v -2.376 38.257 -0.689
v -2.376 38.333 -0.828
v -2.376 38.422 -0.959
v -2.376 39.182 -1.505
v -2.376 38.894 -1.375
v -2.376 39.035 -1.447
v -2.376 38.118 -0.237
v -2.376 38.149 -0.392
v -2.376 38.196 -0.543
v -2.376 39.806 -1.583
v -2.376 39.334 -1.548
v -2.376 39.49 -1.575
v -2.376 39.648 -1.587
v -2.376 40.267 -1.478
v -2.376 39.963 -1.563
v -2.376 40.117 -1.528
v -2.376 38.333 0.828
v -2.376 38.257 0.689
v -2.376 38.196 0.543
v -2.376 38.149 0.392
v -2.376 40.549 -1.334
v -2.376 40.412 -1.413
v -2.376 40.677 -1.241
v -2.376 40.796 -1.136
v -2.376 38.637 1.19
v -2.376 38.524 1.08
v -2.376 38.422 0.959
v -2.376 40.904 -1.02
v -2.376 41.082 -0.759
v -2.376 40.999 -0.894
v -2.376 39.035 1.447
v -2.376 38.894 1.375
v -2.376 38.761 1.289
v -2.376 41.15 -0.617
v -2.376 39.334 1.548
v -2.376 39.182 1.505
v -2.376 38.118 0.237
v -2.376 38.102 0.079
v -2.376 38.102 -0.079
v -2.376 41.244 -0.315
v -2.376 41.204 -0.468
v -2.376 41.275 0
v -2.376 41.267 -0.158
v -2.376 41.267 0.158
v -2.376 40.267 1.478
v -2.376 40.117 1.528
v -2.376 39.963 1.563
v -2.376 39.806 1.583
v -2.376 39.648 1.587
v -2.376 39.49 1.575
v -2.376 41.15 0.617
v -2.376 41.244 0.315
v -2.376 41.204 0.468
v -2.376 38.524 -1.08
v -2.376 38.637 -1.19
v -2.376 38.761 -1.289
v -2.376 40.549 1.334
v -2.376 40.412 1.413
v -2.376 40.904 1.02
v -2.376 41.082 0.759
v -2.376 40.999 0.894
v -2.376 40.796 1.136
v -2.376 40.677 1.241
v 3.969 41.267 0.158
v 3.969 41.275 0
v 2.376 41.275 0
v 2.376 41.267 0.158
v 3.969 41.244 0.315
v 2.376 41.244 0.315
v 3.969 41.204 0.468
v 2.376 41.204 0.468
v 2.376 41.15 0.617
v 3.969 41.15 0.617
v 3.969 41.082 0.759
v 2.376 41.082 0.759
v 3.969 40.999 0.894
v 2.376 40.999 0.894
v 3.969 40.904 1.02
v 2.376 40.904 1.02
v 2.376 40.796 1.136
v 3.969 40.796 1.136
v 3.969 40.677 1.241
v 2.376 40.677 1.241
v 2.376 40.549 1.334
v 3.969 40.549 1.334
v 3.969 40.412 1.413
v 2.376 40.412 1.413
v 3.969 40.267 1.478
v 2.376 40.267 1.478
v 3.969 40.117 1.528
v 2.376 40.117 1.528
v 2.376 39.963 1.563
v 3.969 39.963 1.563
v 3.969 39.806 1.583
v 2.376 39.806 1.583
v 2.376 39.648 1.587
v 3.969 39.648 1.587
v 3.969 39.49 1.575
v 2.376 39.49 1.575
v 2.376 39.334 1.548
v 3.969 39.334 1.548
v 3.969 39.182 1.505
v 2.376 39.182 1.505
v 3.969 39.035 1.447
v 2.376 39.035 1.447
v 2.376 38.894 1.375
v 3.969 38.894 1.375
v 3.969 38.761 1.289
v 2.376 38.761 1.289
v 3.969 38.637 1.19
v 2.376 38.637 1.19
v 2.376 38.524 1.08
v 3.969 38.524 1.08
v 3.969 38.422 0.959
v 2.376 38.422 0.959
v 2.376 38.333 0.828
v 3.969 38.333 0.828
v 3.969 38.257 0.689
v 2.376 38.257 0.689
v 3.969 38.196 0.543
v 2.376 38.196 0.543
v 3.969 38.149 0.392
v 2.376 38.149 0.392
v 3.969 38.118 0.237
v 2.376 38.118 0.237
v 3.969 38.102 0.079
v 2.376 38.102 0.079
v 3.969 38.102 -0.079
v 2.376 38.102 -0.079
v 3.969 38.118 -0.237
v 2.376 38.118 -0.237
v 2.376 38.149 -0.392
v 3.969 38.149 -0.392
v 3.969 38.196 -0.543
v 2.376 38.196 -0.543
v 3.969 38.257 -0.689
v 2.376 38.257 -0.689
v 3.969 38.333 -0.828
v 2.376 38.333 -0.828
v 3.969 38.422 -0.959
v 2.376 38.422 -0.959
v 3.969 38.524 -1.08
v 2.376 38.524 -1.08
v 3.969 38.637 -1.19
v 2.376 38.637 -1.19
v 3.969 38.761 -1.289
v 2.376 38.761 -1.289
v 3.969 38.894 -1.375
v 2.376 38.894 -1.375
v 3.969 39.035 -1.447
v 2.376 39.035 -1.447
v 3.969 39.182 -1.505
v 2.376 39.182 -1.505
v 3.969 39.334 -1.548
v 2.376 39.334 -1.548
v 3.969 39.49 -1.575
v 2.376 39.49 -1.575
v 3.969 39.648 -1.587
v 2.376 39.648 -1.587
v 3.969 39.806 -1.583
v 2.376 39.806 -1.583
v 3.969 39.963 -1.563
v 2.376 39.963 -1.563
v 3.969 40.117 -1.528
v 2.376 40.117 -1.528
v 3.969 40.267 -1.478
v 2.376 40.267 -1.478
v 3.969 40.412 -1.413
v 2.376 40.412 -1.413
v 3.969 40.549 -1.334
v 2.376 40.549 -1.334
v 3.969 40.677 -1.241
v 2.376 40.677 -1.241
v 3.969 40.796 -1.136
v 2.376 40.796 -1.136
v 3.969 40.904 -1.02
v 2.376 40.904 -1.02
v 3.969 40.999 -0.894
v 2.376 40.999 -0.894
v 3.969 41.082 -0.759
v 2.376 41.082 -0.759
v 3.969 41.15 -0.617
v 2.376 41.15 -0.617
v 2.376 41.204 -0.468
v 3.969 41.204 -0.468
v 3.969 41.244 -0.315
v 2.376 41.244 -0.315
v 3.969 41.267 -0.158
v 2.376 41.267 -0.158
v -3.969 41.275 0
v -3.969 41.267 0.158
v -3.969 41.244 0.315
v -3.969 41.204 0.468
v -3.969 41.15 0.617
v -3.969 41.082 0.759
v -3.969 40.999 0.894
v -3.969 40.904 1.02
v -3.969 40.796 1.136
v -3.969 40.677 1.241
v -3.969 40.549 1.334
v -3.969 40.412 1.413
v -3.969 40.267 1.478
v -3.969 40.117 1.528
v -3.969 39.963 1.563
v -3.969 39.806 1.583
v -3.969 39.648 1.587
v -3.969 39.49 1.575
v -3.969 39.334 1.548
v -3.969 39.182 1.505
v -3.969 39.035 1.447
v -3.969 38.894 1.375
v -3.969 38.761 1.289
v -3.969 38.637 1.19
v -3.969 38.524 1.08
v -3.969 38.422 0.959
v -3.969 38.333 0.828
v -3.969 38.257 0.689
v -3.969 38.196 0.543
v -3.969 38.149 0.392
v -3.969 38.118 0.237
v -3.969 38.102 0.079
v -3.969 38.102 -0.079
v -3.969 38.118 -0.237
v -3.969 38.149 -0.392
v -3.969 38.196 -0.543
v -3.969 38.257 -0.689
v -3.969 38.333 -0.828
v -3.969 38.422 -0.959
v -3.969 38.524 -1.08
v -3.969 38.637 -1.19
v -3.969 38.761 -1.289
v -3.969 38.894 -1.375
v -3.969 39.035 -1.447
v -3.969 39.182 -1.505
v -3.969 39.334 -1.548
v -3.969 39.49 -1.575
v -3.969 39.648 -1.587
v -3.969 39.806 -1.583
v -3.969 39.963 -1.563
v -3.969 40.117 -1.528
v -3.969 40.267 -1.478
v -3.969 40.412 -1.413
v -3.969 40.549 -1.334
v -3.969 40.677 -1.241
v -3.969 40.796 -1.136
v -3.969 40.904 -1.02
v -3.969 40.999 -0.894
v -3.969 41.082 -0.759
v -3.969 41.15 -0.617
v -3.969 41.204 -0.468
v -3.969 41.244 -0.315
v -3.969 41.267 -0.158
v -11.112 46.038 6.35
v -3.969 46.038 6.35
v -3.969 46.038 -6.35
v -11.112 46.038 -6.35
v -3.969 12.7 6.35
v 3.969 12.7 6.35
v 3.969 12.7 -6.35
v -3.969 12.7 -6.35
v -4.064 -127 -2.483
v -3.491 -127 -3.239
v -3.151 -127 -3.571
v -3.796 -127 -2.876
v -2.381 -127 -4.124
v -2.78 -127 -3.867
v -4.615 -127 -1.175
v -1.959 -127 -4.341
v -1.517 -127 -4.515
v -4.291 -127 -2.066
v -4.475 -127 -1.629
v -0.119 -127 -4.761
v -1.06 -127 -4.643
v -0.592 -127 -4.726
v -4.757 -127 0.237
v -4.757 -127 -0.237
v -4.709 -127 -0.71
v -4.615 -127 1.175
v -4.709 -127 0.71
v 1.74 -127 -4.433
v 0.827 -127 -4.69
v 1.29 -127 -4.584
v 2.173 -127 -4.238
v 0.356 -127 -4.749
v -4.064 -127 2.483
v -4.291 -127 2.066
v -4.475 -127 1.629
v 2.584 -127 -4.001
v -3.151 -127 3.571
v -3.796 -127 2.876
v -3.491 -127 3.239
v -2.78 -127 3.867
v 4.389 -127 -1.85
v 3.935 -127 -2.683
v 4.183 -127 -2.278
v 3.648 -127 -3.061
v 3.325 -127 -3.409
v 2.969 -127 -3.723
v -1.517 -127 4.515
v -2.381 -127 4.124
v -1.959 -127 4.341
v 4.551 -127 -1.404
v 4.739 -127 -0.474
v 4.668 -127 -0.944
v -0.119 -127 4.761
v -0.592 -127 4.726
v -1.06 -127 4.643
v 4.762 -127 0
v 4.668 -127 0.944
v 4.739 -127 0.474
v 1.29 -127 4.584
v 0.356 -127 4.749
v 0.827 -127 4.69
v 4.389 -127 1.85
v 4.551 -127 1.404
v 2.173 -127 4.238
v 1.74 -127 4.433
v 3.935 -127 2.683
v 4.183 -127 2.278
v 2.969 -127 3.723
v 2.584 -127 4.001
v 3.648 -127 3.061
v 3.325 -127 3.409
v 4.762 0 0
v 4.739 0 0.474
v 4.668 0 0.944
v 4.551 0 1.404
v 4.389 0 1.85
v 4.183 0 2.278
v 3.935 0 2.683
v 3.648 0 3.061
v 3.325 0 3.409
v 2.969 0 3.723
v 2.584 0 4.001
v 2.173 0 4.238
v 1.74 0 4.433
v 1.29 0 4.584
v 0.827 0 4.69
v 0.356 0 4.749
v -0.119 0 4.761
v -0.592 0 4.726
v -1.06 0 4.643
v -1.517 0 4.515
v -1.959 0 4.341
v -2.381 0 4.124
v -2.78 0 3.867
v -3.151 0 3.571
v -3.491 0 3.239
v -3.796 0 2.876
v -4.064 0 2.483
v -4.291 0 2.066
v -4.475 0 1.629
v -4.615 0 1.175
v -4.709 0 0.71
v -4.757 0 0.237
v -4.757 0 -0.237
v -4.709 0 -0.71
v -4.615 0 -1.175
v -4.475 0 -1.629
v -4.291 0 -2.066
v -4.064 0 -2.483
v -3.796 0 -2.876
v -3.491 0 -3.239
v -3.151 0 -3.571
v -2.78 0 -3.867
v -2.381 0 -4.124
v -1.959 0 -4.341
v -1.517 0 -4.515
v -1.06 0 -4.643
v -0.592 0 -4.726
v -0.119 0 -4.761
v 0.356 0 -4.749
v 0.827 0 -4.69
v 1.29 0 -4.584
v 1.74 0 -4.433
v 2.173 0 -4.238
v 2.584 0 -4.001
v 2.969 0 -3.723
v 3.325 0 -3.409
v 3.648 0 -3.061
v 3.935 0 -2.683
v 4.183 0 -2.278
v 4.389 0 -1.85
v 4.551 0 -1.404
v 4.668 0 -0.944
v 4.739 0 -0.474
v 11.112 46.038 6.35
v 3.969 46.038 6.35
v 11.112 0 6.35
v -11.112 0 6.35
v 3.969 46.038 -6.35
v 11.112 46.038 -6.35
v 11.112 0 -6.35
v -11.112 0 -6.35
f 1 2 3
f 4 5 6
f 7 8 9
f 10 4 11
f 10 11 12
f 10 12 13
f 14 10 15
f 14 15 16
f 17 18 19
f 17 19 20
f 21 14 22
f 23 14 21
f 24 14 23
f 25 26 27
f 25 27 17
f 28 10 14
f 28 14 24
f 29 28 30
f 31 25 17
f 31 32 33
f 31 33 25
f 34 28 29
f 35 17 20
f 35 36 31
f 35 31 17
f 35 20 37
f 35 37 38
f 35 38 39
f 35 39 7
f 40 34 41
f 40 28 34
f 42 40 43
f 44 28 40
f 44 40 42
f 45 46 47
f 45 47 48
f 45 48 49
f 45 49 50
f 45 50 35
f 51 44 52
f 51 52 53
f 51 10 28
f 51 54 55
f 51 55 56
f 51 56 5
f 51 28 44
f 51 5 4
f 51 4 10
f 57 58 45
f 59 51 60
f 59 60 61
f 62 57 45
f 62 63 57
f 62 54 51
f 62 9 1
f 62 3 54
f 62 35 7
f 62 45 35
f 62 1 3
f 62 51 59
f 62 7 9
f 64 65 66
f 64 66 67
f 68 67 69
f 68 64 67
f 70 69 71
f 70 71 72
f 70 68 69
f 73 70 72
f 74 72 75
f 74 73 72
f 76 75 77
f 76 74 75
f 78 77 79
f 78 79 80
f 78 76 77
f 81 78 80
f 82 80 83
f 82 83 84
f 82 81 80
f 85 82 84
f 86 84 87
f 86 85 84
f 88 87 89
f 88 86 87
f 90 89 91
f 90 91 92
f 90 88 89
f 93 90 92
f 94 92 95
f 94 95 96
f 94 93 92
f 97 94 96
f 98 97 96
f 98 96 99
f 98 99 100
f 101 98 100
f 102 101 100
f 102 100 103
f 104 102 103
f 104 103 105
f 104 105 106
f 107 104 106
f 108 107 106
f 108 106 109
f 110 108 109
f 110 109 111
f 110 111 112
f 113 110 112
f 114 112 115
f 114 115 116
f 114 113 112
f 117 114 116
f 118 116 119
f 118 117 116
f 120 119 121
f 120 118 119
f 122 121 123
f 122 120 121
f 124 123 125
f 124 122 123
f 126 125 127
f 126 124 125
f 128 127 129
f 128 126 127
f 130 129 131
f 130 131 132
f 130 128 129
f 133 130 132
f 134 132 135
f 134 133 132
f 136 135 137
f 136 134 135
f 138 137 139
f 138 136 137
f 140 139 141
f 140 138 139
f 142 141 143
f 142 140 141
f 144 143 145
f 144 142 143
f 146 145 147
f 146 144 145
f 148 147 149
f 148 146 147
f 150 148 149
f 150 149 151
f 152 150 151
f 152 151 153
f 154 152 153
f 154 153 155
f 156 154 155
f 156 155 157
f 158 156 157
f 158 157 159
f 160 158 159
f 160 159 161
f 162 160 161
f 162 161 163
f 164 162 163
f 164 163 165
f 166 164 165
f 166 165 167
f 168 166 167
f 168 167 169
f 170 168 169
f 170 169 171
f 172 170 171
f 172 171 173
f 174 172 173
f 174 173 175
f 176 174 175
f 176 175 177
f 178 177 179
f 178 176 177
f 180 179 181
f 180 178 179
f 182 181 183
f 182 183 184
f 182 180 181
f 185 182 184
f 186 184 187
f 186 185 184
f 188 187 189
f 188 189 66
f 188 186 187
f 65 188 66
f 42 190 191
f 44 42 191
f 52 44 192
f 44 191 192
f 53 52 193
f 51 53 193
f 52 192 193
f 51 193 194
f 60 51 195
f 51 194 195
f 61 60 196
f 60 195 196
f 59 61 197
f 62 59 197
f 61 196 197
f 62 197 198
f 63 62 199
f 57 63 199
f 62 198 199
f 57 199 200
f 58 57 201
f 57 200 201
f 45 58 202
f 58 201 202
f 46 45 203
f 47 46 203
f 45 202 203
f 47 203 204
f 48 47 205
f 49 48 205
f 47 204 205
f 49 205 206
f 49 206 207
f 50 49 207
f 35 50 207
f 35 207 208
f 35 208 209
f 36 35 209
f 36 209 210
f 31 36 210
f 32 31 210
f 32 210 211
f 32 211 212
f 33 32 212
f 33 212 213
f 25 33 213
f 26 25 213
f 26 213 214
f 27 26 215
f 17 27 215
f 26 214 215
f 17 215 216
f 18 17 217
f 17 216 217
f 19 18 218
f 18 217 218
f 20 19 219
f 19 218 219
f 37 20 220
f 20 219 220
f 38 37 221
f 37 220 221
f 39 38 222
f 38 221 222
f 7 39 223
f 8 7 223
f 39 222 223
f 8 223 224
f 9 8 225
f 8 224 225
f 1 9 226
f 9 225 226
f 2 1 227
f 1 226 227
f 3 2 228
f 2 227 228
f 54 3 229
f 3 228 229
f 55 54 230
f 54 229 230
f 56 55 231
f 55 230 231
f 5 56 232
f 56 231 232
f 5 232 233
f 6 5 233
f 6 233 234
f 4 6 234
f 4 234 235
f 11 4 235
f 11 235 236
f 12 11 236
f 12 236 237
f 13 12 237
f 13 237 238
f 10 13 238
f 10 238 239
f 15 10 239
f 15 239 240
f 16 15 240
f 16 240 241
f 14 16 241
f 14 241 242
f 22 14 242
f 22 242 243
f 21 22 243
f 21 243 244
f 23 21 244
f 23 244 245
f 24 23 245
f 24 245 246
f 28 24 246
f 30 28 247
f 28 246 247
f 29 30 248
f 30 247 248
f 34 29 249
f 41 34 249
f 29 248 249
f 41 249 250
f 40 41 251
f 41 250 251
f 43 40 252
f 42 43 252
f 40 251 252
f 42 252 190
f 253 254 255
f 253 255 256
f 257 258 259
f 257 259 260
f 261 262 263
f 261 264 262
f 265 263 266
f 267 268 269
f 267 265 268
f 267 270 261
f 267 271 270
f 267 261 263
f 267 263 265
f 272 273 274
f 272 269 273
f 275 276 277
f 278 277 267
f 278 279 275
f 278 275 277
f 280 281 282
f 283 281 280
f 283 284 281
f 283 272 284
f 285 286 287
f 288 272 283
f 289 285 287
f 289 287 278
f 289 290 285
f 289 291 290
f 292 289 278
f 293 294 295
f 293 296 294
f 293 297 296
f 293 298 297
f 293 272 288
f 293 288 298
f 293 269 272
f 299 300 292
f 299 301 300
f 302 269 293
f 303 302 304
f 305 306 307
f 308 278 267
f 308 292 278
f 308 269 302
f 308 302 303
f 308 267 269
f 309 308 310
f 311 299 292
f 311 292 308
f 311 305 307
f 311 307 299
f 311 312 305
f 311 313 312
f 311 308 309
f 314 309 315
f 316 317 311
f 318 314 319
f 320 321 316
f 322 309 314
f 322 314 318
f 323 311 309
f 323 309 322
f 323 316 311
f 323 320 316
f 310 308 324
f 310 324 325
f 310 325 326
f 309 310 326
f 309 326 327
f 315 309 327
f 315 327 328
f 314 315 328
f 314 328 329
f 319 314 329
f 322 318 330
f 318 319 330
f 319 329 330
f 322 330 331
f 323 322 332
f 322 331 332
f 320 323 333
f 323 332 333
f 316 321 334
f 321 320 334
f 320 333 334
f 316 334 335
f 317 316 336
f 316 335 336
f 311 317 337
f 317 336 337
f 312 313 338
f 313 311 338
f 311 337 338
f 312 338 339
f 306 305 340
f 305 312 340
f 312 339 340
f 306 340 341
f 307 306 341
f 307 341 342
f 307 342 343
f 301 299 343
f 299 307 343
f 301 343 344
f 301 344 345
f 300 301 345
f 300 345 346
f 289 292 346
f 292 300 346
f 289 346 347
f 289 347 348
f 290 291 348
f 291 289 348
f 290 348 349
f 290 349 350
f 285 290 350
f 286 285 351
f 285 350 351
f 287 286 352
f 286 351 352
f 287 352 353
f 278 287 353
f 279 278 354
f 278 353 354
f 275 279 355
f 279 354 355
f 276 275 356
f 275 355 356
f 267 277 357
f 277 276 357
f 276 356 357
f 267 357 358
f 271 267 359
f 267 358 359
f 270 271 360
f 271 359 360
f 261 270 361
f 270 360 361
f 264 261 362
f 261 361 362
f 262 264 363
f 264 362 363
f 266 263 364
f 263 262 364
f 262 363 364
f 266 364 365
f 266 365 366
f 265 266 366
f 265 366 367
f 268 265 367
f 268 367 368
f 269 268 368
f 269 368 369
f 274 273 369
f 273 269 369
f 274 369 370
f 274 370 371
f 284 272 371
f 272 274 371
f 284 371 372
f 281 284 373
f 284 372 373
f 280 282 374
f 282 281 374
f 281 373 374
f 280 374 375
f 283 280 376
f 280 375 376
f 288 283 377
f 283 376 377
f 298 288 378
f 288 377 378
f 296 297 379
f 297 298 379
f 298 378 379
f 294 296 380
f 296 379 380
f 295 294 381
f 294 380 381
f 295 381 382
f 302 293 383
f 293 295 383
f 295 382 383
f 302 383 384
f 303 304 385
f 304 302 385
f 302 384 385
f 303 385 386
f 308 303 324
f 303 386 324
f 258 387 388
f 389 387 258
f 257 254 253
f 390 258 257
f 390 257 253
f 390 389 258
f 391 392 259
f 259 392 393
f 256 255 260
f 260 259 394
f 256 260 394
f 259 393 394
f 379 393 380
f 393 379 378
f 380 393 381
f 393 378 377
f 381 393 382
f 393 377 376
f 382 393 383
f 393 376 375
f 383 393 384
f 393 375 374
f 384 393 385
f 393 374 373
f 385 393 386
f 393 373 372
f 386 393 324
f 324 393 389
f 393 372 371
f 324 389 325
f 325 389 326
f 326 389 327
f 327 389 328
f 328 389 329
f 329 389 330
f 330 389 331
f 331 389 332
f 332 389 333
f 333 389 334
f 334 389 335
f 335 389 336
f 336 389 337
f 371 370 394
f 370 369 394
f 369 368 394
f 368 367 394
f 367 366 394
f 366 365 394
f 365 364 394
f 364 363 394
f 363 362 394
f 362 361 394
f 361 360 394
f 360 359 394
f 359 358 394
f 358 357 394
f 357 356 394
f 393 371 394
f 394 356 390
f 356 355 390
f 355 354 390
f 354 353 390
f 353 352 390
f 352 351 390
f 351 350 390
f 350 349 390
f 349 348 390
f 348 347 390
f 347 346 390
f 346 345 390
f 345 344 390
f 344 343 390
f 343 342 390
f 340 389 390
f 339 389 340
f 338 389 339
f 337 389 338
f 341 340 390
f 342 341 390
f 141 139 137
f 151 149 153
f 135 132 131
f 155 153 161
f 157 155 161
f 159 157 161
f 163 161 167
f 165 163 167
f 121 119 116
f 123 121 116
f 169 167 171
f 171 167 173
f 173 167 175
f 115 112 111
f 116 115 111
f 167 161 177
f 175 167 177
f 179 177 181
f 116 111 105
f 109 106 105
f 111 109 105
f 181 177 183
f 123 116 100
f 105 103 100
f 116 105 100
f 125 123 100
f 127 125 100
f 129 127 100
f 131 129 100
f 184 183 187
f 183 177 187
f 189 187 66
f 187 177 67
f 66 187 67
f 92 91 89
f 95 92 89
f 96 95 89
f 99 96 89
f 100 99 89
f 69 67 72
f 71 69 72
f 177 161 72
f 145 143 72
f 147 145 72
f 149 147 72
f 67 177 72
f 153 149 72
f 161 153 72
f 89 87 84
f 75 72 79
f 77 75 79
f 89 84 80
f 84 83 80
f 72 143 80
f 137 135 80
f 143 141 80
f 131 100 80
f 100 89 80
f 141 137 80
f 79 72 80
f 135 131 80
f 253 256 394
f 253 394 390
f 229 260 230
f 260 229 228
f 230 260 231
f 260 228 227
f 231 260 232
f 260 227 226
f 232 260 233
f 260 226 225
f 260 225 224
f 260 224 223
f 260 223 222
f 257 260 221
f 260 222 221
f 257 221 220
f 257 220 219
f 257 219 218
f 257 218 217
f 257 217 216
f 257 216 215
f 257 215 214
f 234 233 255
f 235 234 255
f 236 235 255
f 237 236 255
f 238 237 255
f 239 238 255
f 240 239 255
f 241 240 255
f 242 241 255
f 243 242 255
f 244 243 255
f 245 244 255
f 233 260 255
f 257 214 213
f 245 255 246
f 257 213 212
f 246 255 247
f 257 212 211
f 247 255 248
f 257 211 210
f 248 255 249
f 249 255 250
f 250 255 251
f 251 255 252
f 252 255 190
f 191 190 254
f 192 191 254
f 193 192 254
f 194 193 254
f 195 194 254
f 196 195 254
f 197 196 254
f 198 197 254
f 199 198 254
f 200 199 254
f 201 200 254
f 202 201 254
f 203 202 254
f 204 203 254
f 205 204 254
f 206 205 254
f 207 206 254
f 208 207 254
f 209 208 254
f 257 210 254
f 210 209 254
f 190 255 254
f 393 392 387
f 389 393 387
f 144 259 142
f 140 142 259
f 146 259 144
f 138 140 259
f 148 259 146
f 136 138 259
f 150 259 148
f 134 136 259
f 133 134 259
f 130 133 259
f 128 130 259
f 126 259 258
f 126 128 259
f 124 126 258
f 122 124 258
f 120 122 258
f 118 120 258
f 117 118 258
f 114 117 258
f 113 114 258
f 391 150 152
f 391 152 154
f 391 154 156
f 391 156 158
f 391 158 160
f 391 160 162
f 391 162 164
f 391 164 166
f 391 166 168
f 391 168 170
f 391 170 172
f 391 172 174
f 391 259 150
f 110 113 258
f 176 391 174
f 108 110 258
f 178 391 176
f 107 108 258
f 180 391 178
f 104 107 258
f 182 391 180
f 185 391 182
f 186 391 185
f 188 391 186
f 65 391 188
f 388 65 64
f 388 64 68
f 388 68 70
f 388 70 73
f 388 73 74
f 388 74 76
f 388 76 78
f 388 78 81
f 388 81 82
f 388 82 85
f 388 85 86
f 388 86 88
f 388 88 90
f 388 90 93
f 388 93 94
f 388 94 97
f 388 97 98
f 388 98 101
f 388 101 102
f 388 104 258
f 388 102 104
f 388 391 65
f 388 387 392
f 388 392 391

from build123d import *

# Parameters (mm, degrees)
F0_R     = 4.7625
F1_DEPTH = 127
F2_W     = 22.225
F2_H     = 12.7
F3_DEPTH = 46.0375
F4_W     = 7.9375
F4_H     = 12.7
F5_DEPTH = 33.3375
F6_R     = 1.5875
F7_DEPTH = 1.59258


with BuildPart() as f1:
    # F0 (on Front) → F1 (new body)
    with BuildSketch(Plane.XZ):
        Circle(F0_R)
    extrude(amount=F1_DEPTH)

    # F2 (on face) → F3 (join)
    with BuildSketch(Plane(origin=(0, 0, 0), x_dir=(-1, 0, 0), z_dir=(0, 1, 0))):
        Rectangle(F2_W, F2_H)
    extrude(amount=F3_DEPTH)

    # F4 (on face) → F5 (cut)
    with BuildSketch(Plane(origin=(0, 46.0375, 0), x_dir=(-1, 0, 0), z_dir=(0, 1, 0))):
        Rectangle(F4_W, F4_H)
    extrude(amount=-F5_DEPTH, mode=Mode.SUBTRACT)

    # F6 (on face) → F7 (join)
    with BuildSketch(Plane.YZ.offset(-3.96875)):
        with Locations((39.6875, 0)):
            Circle(F6_R)
    extrude(amount=F7_DEPTH)

    # F8: F1 across plane


with BuildPart() as f1_1:
    add(f1.part)
    add(f1.part.mirror(Plane.YZ))


solid = f1_1.part
